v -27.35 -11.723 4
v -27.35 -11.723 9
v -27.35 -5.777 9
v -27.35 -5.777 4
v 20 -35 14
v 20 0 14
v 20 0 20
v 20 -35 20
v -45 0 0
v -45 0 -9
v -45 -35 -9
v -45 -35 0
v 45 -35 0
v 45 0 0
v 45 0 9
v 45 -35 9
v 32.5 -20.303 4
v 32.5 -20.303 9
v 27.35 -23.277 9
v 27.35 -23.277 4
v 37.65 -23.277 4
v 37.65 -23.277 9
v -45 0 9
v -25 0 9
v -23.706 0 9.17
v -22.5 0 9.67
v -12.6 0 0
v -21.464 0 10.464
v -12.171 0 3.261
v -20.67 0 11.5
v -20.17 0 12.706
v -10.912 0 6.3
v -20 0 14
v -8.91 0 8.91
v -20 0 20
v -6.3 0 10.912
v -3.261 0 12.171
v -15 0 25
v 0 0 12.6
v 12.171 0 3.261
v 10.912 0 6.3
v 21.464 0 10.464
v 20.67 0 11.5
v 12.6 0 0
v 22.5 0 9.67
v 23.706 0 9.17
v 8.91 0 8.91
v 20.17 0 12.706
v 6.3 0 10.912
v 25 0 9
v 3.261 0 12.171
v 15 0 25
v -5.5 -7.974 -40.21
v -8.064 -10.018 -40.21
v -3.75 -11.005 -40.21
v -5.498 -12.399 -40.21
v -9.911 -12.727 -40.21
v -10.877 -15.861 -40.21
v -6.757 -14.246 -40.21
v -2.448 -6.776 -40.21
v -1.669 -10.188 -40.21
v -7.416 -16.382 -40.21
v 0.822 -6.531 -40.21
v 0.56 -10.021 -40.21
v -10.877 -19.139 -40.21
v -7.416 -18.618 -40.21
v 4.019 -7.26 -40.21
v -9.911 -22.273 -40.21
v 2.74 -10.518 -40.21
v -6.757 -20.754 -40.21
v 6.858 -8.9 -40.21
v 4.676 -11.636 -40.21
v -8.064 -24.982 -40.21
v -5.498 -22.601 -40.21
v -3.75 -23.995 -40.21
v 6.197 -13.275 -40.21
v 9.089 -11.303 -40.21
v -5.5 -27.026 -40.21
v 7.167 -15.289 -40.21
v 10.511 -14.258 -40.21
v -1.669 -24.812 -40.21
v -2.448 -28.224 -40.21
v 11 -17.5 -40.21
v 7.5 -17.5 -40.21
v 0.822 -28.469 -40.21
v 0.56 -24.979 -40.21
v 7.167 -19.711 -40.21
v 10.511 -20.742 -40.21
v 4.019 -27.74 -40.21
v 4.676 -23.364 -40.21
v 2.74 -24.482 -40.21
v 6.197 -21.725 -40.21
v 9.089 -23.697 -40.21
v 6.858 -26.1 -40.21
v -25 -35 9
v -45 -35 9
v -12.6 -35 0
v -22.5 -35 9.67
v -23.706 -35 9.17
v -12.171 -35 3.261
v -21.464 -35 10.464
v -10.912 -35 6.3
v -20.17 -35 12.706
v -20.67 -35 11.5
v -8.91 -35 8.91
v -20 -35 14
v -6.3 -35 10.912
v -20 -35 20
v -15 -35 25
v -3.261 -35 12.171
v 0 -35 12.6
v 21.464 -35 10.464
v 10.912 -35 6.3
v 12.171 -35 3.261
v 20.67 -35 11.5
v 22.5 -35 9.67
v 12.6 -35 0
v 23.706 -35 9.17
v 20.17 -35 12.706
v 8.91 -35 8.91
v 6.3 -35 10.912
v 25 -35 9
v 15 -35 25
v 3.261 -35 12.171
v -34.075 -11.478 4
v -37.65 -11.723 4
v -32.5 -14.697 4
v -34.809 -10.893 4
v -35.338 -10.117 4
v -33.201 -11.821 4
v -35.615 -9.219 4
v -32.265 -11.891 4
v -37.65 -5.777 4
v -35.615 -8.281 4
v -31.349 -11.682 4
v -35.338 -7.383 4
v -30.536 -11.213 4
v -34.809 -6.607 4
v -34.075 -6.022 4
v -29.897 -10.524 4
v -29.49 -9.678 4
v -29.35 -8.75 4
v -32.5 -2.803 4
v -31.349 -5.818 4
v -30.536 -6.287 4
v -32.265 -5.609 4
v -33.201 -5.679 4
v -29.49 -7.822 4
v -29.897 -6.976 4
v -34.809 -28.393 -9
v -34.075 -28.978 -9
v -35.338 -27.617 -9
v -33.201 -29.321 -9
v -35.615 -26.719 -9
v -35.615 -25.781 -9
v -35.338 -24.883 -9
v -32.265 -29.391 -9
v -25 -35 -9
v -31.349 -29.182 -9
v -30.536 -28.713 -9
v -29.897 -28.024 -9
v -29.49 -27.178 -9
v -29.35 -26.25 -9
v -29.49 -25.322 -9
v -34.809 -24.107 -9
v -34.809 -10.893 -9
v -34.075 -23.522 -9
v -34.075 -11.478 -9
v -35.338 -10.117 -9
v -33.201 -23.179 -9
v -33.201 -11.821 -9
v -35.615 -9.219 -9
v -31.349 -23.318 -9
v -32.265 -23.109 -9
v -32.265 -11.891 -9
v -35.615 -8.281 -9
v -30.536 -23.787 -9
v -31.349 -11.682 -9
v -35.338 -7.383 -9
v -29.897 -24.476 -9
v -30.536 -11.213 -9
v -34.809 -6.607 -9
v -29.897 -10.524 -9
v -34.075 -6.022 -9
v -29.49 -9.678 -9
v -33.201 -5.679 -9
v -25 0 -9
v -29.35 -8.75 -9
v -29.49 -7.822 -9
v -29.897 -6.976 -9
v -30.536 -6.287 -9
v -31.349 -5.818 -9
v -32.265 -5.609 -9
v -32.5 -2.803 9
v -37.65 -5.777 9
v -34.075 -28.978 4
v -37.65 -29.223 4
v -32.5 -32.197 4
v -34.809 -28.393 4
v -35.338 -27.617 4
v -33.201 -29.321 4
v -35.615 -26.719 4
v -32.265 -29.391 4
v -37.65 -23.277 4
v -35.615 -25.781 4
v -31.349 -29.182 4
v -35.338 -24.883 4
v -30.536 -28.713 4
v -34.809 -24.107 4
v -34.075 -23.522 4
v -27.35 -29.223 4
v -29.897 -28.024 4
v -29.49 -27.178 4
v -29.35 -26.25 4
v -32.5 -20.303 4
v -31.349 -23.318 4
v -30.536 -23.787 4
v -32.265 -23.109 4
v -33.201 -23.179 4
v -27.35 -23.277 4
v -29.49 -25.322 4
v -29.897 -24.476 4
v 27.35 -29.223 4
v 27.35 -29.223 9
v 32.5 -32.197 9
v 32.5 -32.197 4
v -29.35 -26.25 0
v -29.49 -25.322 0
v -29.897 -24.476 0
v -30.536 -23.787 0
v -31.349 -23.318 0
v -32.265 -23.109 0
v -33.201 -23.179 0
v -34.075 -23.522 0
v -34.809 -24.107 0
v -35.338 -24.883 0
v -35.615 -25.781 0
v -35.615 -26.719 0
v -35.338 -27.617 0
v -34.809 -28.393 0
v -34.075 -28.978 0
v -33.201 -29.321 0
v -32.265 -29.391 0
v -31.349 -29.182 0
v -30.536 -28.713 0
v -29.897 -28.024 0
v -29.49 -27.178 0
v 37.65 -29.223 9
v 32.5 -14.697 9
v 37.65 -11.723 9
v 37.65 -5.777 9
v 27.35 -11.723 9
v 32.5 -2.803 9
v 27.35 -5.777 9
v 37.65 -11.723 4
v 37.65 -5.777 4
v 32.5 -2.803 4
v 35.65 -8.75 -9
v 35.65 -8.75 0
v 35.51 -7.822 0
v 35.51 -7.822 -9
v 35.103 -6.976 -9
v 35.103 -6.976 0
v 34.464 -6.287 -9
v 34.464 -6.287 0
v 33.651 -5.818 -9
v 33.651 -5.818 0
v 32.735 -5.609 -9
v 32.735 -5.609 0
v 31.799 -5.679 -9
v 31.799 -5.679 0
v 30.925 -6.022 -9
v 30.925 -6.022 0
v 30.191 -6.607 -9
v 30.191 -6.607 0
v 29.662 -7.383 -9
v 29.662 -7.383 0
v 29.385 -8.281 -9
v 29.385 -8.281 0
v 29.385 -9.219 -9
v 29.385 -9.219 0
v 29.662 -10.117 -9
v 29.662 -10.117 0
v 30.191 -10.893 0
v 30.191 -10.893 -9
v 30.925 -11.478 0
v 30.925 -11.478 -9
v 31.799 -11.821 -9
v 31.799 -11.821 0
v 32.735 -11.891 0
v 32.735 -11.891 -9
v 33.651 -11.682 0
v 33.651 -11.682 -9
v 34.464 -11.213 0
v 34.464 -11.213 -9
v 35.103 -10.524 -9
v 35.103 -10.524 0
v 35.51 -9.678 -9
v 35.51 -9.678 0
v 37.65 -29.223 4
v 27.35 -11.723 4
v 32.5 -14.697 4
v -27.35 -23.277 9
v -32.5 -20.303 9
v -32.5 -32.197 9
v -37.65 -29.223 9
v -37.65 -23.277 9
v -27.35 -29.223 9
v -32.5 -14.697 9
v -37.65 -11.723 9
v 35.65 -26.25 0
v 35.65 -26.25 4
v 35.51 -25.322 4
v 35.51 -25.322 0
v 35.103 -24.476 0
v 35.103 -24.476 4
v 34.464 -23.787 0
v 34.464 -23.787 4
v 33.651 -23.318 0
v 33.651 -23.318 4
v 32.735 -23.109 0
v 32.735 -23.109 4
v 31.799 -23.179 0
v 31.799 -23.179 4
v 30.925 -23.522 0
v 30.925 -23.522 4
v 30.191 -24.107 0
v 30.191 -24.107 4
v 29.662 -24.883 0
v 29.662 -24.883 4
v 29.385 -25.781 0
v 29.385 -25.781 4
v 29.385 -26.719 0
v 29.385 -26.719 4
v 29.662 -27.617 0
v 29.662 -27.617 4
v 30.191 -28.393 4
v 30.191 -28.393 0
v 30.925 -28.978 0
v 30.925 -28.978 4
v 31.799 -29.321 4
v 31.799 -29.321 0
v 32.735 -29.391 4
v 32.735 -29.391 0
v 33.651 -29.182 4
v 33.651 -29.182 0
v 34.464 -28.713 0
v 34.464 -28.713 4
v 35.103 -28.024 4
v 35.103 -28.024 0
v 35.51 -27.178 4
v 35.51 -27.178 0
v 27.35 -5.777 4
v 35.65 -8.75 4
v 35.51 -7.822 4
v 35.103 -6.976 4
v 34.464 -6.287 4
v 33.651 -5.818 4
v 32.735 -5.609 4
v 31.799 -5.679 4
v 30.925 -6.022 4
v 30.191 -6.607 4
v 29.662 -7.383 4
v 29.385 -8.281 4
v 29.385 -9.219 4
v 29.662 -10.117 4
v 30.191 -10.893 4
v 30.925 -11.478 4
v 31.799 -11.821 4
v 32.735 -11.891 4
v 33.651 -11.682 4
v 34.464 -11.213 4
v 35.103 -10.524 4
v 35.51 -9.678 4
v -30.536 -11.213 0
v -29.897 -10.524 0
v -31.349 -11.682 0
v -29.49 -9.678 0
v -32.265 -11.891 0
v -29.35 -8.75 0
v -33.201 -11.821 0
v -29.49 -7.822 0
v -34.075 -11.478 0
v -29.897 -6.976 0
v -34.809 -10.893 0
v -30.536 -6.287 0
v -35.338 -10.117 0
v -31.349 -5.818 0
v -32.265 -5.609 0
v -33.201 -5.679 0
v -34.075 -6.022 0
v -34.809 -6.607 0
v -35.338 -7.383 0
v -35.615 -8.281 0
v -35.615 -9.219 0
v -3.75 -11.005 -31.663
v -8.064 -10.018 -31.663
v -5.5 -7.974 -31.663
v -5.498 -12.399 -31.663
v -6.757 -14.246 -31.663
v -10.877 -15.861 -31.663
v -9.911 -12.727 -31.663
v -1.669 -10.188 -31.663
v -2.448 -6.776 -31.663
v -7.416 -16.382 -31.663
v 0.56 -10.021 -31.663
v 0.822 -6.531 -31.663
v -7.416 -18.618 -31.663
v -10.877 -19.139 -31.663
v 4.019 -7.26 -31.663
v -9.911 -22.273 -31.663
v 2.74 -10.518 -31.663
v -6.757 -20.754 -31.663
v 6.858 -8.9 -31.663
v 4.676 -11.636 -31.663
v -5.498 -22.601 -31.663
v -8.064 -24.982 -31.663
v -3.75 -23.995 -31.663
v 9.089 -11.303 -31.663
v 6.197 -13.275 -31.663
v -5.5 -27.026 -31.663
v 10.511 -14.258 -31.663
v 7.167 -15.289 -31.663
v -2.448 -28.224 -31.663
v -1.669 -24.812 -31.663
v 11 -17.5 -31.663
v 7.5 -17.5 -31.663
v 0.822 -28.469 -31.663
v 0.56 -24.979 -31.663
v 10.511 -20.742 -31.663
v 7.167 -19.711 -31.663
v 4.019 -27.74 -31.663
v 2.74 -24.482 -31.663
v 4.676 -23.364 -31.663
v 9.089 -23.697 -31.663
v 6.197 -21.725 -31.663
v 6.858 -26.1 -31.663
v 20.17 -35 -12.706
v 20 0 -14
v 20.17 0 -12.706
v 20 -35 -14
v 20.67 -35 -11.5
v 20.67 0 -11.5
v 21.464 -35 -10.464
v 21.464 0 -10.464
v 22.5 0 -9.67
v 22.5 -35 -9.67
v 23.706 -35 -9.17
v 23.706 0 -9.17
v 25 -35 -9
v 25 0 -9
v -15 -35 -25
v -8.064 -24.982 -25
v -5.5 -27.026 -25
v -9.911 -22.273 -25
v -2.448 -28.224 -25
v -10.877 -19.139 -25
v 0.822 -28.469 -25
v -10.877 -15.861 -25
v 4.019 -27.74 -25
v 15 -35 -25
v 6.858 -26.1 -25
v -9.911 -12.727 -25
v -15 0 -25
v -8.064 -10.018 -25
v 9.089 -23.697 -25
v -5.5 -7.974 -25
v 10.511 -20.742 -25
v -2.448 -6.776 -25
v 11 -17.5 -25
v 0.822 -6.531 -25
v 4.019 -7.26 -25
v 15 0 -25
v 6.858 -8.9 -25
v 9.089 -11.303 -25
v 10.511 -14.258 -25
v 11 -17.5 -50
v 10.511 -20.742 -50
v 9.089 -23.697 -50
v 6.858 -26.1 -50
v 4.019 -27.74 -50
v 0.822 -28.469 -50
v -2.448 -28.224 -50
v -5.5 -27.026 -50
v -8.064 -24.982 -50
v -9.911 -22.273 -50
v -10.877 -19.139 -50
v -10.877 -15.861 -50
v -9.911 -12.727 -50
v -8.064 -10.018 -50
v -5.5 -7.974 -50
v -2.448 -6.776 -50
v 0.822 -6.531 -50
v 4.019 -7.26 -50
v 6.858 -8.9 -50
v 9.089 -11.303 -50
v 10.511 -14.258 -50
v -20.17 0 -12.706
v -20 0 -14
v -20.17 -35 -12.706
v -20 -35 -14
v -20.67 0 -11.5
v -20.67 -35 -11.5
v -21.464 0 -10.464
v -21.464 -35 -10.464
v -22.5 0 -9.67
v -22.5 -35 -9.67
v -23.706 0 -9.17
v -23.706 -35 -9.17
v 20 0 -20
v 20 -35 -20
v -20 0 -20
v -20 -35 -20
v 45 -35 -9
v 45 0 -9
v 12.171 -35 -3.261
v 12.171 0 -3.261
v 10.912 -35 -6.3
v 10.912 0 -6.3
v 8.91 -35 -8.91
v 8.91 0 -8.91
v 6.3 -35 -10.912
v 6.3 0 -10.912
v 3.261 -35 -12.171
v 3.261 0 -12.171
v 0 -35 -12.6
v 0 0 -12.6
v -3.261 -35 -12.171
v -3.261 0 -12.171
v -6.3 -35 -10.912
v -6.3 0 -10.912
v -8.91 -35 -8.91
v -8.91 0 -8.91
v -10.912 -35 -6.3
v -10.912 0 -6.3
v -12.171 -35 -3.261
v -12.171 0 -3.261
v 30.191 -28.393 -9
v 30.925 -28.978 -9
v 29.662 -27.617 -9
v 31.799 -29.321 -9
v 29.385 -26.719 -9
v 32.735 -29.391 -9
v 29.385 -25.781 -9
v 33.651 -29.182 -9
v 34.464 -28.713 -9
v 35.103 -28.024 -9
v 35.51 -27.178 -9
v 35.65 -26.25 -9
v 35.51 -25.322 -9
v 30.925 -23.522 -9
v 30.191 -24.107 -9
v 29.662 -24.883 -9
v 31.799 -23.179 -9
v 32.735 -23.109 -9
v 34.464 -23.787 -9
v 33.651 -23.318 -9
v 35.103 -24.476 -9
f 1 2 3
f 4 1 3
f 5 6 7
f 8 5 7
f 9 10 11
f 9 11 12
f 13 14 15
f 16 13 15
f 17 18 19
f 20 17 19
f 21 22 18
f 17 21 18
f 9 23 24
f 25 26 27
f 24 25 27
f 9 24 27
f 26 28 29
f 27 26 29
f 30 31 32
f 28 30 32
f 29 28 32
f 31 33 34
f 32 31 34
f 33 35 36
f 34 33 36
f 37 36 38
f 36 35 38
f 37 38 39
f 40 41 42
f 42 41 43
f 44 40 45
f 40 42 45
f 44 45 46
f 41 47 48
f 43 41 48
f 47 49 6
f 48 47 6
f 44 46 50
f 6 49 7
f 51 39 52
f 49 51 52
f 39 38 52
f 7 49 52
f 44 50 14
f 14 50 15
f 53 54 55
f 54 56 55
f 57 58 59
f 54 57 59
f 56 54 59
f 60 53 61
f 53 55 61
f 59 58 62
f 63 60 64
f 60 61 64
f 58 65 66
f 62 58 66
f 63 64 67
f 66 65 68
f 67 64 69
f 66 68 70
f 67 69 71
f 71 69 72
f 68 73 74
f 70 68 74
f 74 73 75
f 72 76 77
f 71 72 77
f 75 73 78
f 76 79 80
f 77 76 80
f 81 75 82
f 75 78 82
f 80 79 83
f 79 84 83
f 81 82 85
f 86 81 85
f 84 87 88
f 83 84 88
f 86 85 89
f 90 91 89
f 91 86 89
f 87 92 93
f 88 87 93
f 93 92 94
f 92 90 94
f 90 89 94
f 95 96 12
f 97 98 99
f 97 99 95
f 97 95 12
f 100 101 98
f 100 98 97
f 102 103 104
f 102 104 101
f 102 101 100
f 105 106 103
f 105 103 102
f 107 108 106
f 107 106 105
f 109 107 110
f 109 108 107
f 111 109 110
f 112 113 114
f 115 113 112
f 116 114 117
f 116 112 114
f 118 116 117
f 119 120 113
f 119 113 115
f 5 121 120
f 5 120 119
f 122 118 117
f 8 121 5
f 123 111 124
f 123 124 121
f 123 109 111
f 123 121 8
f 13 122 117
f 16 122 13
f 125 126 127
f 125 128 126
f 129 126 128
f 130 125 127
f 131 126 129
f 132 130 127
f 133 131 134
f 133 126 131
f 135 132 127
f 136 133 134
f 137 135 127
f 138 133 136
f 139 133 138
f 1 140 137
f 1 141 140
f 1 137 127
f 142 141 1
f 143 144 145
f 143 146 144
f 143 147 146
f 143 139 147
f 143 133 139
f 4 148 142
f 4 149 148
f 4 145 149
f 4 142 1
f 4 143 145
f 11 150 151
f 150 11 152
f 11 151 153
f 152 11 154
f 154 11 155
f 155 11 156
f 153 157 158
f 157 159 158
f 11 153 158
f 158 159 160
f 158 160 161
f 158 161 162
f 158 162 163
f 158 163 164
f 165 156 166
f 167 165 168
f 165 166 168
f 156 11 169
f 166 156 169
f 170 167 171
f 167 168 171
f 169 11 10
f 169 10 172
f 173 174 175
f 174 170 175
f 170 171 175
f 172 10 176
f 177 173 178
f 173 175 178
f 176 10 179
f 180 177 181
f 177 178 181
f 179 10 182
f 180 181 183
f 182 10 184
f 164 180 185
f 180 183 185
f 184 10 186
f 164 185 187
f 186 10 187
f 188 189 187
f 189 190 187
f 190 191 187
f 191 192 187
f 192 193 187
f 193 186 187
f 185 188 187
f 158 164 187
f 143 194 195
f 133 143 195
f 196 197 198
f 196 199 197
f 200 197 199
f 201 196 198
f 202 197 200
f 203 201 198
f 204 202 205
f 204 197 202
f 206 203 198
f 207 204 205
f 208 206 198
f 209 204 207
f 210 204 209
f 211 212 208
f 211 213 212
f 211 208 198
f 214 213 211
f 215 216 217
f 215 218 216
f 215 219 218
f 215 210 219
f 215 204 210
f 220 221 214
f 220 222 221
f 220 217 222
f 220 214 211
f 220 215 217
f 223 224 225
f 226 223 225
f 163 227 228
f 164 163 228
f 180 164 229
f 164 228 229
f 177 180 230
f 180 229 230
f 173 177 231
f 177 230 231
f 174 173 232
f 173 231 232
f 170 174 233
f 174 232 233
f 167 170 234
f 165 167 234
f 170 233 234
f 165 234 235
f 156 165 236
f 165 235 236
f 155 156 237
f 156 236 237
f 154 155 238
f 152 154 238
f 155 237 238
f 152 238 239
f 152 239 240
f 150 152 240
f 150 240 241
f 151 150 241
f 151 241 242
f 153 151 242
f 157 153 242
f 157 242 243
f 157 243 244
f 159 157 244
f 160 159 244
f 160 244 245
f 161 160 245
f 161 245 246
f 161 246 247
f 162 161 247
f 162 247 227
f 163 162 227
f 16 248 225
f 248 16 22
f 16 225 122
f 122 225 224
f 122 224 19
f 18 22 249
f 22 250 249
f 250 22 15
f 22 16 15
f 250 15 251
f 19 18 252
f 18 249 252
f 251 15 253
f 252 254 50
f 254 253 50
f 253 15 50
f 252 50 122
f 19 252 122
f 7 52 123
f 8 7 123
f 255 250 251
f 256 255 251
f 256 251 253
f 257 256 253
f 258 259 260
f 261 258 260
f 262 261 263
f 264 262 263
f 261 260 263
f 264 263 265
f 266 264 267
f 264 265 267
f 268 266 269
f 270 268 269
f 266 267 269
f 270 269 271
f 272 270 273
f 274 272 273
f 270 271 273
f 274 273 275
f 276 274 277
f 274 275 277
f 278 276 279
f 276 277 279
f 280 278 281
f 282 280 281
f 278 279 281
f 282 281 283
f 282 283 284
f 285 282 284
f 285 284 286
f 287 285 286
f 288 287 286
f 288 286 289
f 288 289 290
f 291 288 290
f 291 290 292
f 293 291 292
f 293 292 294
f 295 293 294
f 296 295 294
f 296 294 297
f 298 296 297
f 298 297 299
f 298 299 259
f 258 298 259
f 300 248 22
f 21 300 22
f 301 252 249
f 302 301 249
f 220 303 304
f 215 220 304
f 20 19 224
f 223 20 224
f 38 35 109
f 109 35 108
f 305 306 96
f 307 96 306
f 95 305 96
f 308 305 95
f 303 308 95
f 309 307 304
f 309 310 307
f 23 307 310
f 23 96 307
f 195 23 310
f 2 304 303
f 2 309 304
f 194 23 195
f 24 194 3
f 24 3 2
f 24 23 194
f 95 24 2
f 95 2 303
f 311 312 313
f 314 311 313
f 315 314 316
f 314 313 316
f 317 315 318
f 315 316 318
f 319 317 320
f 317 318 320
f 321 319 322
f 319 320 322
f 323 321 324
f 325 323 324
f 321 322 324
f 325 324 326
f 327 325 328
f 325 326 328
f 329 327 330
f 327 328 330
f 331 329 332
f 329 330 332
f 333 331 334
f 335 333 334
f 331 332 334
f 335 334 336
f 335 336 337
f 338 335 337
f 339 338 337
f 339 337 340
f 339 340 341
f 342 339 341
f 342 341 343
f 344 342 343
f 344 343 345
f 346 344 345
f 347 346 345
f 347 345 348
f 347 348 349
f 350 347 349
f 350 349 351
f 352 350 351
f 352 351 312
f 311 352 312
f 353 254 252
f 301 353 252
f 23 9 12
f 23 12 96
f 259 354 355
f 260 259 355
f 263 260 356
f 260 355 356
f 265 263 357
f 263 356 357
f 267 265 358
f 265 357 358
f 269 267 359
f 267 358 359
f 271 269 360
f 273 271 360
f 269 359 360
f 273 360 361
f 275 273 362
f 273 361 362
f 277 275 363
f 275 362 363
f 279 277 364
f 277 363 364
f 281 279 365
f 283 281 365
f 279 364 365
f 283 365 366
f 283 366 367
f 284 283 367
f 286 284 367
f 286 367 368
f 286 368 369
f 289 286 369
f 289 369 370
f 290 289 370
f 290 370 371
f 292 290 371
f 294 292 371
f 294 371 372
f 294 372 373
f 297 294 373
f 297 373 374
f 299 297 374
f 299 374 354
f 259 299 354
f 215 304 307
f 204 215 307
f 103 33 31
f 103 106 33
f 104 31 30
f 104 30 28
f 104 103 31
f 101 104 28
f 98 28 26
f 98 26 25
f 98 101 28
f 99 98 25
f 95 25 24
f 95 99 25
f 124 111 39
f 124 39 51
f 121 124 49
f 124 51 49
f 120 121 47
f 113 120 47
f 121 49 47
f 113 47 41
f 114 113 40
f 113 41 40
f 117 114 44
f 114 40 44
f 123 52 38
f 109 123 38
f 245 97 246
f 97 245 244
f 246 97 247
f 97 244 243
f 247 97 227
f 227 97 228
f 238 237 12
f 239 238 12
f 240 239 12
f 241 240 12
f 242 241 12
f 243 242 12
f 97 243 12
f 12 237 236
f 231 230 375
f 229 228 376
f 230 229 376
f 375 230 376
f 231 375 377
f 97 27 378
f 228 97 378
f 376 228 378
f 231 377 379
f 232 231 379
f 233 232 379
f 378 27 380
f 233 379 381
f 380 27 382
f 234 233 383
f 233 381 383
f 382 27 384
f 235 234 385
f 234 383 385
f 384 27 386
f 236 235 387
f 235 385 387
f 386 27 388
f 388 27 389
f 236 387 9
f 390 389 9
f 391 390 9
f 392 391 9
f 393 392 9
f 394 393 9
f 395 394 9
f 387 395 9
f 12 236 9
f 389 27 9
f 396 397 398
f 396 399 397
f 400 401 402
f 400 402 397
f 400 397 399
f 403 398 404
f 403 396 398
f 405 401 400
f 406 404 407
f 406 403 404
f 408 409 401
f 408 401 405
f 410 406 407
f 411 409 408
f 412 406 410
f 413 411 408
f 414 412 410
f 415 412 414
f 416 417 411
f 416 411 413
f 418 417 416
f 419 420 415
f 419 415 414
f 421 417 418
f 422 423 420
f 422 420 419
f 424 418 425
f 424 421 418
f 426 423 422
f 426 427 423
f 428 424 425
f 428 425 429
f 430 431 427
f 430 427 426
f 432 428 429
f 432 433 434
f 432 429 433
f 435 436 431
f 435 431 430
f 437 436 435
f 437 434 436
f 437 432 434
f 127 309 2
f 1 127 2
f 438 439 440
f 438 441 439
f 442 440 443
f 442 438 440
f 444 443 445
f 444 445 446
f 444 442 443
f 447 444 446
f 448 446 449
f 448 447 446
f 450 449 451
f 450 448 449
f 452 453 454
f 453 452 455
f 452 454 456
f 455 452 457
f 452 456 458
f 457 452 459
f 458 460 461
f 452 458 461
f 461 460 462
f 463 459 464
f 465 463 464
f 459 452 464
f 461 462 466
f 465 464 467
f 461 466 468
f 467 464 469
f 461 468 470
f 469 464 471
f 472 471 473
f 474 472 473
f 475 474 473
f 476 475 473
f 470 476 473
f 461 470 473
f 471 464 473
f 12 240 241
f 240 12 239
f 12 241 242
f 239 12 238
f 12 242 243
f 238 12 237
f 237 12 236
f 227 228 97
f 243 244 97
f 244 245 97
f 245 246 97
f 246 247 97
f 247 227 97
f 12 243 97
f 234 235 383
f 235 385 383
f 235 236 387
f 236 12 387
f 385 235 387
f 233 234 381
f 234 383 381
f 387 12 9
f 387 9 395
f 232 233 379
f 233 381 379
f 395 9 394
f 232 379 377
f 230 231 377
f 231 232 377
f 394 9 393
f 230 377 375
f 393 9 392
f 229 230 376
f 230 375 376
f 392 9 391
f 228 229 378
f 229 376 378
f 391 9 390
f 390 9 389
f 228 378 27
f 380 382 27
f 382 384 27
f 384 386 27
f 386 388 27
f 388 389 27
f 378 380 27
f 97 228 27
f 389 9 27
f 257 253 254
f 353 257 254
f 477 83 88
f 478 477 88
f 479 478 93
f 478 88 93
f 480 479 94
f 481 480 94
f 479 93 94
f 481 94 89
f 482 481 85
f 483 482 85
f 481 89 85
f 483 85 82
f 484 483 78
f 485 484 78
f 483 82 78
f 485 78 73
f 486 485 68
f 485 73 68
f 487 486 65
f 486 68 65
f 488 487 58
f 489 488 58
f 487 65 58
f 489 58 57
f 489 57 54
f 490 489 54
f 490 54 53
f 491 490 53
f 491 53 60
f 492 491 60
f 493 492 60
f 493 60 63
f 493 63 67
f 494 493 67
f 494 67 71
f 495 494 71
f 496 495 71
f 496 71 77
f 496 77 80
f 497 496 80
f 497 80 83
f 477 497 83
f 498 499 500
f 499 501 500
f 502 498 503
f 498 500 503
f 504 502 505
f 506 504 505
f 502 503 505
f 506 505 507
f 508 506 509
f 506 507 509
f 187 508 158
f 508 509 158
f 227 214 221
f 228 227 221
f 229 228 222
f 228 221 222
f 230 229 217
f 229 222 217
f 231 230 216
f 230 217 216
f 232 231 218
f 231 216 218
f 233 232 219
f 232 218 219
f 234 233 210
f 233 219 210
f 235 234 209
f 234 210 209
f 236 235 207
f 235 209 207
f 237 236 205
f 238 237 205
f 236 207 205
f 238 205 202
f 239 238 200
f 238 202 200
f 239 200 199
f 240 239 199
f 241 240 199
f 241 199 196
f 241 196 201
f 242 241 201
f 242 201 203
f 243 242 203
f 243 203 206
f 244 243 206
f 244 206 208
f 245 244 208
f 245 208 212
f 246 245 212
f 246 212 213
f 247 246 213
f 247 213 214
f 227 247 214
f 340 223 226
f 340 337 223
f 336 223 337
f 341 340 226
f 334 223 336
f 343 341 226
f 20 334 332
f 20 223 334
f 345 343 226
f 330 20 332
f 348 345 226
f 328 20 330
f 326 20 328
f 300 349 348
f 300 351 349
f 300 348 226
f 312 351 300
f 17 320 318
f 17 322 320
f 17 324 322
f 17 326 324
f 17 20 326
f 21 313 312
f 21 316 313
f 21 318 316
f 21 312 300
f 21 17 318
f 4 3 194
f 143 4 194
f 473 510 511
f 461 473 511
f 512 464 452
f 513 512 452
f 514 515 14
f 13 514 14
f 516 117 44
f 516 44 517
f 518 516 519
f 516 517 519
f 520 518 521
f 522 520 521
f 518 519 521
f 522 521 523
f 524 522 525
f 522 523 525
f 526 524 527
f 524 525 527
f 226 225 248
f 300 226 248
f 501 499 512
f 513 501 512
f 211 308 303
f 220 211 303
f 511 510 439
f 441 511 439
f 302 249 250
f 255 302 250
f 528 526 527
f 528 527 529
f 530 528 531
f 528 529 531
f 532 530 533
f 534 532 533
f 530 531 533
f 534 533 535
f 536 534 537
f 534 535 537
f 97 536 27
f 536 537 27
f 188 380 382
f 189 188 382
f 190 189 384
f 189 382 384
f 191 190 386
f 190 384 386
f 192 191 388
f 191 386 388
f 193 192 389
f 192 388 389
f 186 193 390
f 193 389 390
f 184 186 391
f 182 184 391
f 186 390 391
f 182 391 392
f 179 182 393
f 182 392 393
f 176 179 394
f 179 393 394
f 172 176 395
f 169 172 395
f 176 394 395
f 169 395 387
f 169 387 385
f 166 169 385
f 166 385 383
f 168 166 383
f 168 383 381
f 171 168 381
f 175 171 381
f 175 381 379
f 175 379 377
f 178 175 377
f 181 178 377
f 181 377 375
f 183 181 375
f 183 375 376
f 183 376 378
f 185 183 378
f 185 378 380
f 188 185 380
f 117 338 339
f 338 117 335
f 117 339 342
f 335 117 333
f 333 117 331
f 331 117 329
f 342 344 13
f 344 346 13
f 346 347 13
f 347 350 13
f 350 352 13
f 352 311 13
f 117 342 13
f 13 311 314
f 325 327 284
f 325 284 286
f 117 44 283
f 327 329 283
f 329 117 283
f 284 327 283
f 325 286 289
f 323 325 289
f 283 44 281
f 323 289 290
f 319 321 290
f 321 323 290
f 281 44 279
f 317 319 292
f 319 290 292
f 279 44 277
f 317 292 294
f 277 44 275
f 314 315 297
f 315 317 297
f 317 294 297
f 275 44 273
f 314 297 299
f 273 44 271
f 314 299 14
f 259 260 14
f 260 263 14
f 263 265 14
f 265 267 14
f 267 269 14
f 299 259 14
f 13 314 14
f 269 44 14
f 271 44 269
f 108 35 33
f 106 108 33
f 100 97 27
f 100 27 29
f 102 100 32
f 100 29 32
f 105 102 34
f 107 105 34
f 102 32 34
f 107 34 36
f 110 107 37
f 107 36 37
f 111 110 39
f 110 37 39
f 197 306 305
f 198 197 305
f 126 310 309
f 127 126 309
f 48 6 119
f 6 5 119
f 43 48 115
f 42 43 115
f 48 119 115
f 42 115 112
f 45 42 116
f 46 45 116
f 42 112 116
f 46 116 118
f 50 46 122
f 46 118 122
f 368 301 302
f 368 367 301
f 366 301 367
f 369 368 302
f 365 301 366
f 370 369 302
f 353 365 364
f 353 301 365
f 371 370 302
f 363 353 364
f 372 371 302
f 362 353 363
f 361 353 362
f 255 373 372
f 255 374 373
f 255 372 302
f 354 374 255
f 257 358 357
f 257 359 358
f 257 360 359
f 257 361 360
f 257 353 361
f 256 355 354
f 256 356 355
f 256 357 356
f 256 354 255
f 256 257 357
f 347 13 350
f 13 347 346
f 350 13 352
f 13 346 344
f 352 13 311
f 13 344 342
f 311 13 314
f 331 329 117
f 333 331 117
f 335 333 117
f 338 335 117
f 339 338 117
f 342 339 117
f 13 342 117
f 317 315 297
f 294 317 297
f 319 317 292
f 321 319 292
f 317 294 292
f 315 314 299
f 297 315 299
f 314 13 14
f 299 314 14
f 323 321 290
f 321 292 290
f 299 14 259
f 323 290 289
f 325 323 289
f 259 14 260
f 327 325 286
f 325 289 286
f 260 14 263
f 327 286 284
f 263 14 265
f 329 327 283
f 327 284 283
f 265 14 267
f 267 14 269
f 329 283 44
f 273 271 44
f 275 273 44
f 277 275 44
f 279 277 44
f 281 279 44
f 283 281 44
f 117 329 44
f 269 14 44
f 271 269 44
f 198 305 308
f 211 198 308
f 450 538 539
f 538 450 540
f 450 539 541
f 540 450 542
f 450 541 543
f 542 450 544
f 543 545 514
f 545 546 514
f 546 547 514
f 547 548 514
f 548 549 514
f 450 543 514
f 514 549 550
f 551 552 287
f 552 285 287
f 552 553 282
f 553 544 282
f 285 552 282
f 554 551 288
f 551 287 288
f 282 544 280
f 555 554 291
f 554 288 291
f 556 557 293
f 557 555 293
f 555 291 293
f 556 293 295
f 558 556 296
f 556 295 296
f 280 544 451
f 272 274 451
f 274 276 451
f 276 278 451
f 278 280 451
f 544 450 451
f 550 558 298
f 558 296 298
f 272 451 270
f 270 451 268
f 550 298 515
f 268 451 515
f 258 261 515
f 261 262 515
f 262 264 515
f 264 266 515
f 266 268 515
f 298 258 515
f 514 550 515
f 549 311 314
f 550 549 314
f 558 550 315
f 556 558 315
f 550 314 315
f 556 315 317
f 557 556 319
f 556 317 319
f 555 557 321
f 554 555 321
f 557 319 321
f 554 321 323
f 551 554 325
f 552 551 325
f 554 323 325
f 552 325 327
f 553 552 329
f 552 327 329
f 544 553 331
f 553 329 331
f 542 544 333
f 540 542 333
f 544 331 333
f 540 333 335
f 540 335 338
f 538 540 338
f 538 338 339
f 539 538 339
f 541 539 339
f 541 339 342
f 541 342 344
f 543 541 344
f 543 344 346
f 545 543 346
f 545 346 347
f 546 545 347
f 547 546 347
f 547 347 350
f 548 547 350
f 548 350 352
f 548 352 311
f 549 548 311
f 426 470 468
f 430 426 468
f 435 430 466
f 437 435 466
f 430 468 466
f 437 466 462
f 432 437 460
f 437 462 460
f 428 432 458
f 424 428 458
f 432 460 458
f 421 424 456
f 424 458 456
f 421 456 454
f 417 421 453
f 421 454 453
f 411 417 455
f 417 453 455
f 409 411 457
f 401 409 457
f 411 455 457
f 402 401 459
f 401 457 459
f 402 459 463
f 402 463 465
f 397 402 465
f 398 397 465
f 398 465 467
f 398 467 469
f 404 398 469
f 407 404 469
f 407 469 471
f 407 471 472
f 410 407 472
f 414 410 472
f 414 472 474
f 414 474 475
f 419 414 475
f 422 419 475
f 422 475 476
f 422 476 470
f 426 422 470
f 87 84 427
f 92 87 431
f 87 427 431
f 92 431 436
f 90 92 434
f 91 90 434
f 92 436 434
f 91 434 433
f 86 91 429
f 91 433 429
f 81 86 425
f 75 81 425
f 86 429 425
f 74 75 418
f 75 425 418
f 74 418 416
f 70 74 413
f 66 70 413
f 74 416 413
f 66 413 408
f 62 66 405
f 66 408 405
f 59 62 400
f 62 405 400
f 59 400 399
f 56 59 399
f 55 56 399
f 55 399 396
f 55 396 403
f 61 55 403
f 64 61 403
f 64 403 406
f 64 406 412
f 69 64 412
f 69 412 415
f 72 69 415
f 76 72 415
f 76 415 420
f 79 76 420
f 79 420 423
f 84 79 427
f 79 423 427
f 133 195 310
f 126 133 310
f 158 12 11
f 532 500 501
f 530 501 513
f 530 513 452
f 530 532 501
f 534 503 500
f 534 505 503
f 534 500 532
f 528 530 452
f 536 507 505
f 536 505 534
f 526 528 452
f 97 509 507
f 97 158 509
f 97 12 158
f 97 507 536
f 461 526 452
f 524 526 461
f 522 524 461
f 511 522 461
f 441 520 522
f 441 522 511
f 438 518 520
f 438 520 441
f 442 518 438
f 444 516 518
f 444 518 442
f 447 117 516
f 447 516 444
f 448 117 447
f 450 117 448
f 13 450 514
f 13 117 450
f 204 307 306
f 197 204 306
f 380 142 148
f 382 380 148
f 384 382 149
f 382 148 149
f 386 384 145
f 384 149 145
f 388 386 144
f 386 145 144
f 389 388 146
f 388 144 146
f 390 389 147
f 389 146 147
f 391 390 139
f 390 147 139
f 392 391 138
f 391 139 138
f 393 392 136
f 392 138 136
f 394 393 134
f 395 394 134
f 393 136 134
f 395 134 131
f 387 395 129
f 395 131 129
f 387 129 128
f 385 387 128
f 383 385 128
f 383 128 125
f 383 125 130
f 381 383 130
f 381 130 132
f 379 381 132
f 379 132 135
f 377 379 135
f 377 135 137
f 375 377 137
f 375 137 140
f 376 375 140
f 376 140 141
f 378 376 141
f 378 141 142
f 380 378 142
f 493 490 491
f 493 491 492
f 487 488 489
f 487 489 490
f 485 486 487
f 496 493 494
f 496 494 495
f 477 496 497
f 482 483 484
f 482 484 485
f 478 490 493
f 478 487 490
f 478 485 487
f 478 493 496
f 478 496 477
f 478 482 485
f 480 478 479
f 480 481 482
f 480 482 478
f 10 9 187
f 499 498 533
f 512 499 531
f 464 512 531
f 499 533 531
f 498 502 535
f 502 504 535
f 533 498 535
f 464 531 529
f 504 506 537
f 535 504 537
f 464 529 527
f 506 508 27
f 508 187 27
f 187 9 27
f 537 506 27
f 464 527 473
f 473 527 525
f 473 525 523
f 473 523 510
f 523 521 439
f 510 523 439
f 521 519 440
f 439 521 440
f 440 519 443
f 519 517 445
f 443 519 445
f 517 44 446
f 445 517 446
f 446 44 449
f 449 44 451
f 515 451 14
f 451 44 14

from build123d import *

# Parameters (mm, degrees)
F8_W      = 25
F8_H      = 9
F9_DEPTH  = 35
F0_R      = 3.15
F10_DEPTH = 5
F1_SIZE   = 5
F2_DEPTH  = 35
F3_SIZE   = 5
F11_R     = 11
F11_R_2   = 7.5
F4_DEPTH  = 25
F5_START  = 6.66327
F5_DEPTH  = 8.54696
F6_DEPTH  = 59.001
F7_R      = 5
F7_2_R    = 5


with BuildPart() as f9:
    # F8 (on Front) → F9 (new body)
    with BuildSketch(Plane.XZ):
        with BuildLine():
            ThreePointArc((-12.6, 0), (-8.909545443, 8.909545443), (0, 12.6))
            Line((0, 12.6), (0, 25))
            Line((0, 25), (-20, 25))
            Line((-20, 25), (-20, 9))
            Line((-20, 9), (-20, 0))
            Line((-20, 0), (-12.6, 0))
        make_face()
        Polygon((20, 9), (20, 0), (28.6917275764, 0), (45, 0), (45, 9), align=None)
        with Locations((-32.5, 4.5)):
            Rectangle(F8_W, F8_H)
        with BuildLine():
            ThreePointArc((0, 12.6), (8.909545443, 8.909545443), (12.6, 0))
            Line((12.6, 0), (20, 0))
            Line((20, 0), (20, 9))
            Line((20, 9), (20, 25))
            Line((20, 25), (0, 25))
            Line((0, 25), (0, 12.6))
        make_face()
    extrude(amount=F9_DEPTH)

    # F0 (on face) → F10 (cut)
    with BuildSketch(Plane.XY.offset(9)):
        Polygon((27.35, -11.7233538863), (32.5, -14.6967077727), (37.65, -11.7233538863), (37.65, -5.7766461137), (32.5, -2.8032922273), (27.35, -5.7766461137), align=None)
        with Locations((32.5, -8.75)):
            Circle(F0_R, mode=Mode.SUBTRACT)
        Polygon((27.35, -29.2233538863), (32.5, -32.1967077727), (37.65, -29.2233538863), (37.65, -23.2766461137), (32.5, -20.3032922273), (27.35, -23.2766461137), align=None)
        with Locations((32.5, -26.25)):
            Circle(F0_R, mode=Mode.SUBTRACT)
        Polygon((-27.35, -5.7766461137), (-32.5, -2.8032922273), (-37.65, -5.7766461137), (-37.65, -11.7233538863), (-32.5, -14.6967077727), (-27.35, -11.7233538863), align=None)
        with Locations((-32.5, -8.75)):
            Circle(F0_R, mode=Mode.SUBTRACT)
        Polygon((-32.5, -20.3032922273), (-37.65, -23.2766461137), (-37.65, -29.2233538863), (-32.5, -32.1967077727), (-27.35, -29.2233538863), (-27.35, -23.2766461137), align=None)
        with Locations((-32.5, -26.25)):
            Circle(F0_R, mode=Mode.SUBTRACT)
        with Locations((32.5, -8.75)):
            Circle(F0_R)
        with Locations((32.5, -26.25)):
            Circle(F0_R)
        with Locations((-32.5, -8.75)):
            Circle(F0_R)
        with Locations((-32.5, -26.25)):
            Circle(F0_R)
    extrude(amount=-F10_DEPTH, mode=Mode.SUBTRACT)

    # F1
    f1_edges = [f9.edges().sort_by_distance(p)[0] for p in [
        (-20, -17.5, 25),
        (20, -17.5, 25),
    ]]
    chamfer(f1_edges, length=F1_SIZE)


with BuildPart() as f2:
    # F8 (on Front) → F2 (new body, through all)
    with BuildSketch(Plane.XZ):
        with Locations((-32.5, -4.5)):
            Rectangle(F8_W, F8_H)
        Polygon((28.6917275764, 0), (20, 0), (20, -9), (45, -9), (45, 0), align=None)
        with BuildLine():
            Line((0, -25), (0, -12.6))
            ThreePointArc((0, -12.6), (-8.909545443, -8.909545443), (-12.6, 0))
            Line((-12.6, 0), (-20, 0))
            Line((-20, 0), (-20, -9))
            Line((-20, -9), (-20, -25))
            Line((-20, -25), (0, -25))
        make_face()
        with BuildLine():
            Line((20, 0), (12.6, 0))
            ThreePointArc((12.6, 0), (8.909545443, -8.909545443), (0, -12.6))
            Line((0, -12.6), (0, -25))
            Line((0, -25), (20, -25))
            Line((20, -25), (20, -9))
            Line((20, -9), (20, 0))
        make_face()
    extrude(amount=F2_DEPTH)

    # F3
    f3_edges = [f2.edges().sort_by_distance(p)[0] for p in [
        (-20, -17.5, -25),
        (20, -17.5, -25),
    ]]
    chamfer(f3_edges, length=F3_SIZE)

    # F11 (on face) → F4 (join)
    with BuildSketch(Plane(origin=(0, 0, -25), x_dir=(1, 0, 0), z_dir=(0, 0, -1))):
        with Locations((0, 17.5)):
            Circle(F11_R)
        with Locations((0, 17.5)):
            Circle(F11_R_2, mode=Mode.SUBTRACT)
        with Locations((0, 17.5)):
            Circle(F11_R_2)
    extrude(amount=F4_DEPTH)

    # F11 (on face) → F5 (cut)
    with BuildSketch(Plane(origin=(0, 0, -25), x_dir=(1, 0, 0), z_dir=(0, 0, -1)).offset(F5_START)):
        with Locations((0, 17.5)):
            Circle(F11_R)
        with Locations((0, 17.5)):
            Circle(F11_R_2, mode=Mode.SUBTRACT)
    extrude(amount=F5_DEPTH, mode=Mode.SUBTRACT)


with BuildPart() as f6_tool:
    # F0 (on face) → F6 (new body, through all)
    with BuildSketch(Plane.XY.offset(9)):
        with Locations((-32.5, -26.25)):
            Circle(F0_R)
        with Locations((-32.5, -8.75)):
            Circle(F0_R)
        with Locations((32.5, -8.75)):
            Circle(F0_R)
        with Locations((32.5, -26.25)):
            Circle(F0_R)
    extrude(amount=-F6_DEPTH)


with BuildPart() as f9_1:
    add(f9.part)

    # F6: cut by f6_tool
    add(f6_tool.part, mode=Mode.SUBTRACT)

    # F7
    f7_edges = [f9_1.edges().sort_by_distance(p)[0] for p in [
        (-20, -17.5, 9),
        (20, -17.5, 9),
    ]]
    fillet(f7_edges, radius=F7_R)


with BuildPart() as f2_1:
    add(f2.part)

    # F6: cut by f6_tool
    add(f6_tool.part, mode=Mode.SUBTRACT)

    # F7#2
    f7_2_edges = [f2_1.edges().sort_by_distance(p)[0] for p in [
        (20, -17.5, -9),
        (-20, -17.5, -9),
    ]]
    fillet(f7_2_edges, radius=F7_2_R)


solid = Compound([f9_1.part, f2_1.part])
